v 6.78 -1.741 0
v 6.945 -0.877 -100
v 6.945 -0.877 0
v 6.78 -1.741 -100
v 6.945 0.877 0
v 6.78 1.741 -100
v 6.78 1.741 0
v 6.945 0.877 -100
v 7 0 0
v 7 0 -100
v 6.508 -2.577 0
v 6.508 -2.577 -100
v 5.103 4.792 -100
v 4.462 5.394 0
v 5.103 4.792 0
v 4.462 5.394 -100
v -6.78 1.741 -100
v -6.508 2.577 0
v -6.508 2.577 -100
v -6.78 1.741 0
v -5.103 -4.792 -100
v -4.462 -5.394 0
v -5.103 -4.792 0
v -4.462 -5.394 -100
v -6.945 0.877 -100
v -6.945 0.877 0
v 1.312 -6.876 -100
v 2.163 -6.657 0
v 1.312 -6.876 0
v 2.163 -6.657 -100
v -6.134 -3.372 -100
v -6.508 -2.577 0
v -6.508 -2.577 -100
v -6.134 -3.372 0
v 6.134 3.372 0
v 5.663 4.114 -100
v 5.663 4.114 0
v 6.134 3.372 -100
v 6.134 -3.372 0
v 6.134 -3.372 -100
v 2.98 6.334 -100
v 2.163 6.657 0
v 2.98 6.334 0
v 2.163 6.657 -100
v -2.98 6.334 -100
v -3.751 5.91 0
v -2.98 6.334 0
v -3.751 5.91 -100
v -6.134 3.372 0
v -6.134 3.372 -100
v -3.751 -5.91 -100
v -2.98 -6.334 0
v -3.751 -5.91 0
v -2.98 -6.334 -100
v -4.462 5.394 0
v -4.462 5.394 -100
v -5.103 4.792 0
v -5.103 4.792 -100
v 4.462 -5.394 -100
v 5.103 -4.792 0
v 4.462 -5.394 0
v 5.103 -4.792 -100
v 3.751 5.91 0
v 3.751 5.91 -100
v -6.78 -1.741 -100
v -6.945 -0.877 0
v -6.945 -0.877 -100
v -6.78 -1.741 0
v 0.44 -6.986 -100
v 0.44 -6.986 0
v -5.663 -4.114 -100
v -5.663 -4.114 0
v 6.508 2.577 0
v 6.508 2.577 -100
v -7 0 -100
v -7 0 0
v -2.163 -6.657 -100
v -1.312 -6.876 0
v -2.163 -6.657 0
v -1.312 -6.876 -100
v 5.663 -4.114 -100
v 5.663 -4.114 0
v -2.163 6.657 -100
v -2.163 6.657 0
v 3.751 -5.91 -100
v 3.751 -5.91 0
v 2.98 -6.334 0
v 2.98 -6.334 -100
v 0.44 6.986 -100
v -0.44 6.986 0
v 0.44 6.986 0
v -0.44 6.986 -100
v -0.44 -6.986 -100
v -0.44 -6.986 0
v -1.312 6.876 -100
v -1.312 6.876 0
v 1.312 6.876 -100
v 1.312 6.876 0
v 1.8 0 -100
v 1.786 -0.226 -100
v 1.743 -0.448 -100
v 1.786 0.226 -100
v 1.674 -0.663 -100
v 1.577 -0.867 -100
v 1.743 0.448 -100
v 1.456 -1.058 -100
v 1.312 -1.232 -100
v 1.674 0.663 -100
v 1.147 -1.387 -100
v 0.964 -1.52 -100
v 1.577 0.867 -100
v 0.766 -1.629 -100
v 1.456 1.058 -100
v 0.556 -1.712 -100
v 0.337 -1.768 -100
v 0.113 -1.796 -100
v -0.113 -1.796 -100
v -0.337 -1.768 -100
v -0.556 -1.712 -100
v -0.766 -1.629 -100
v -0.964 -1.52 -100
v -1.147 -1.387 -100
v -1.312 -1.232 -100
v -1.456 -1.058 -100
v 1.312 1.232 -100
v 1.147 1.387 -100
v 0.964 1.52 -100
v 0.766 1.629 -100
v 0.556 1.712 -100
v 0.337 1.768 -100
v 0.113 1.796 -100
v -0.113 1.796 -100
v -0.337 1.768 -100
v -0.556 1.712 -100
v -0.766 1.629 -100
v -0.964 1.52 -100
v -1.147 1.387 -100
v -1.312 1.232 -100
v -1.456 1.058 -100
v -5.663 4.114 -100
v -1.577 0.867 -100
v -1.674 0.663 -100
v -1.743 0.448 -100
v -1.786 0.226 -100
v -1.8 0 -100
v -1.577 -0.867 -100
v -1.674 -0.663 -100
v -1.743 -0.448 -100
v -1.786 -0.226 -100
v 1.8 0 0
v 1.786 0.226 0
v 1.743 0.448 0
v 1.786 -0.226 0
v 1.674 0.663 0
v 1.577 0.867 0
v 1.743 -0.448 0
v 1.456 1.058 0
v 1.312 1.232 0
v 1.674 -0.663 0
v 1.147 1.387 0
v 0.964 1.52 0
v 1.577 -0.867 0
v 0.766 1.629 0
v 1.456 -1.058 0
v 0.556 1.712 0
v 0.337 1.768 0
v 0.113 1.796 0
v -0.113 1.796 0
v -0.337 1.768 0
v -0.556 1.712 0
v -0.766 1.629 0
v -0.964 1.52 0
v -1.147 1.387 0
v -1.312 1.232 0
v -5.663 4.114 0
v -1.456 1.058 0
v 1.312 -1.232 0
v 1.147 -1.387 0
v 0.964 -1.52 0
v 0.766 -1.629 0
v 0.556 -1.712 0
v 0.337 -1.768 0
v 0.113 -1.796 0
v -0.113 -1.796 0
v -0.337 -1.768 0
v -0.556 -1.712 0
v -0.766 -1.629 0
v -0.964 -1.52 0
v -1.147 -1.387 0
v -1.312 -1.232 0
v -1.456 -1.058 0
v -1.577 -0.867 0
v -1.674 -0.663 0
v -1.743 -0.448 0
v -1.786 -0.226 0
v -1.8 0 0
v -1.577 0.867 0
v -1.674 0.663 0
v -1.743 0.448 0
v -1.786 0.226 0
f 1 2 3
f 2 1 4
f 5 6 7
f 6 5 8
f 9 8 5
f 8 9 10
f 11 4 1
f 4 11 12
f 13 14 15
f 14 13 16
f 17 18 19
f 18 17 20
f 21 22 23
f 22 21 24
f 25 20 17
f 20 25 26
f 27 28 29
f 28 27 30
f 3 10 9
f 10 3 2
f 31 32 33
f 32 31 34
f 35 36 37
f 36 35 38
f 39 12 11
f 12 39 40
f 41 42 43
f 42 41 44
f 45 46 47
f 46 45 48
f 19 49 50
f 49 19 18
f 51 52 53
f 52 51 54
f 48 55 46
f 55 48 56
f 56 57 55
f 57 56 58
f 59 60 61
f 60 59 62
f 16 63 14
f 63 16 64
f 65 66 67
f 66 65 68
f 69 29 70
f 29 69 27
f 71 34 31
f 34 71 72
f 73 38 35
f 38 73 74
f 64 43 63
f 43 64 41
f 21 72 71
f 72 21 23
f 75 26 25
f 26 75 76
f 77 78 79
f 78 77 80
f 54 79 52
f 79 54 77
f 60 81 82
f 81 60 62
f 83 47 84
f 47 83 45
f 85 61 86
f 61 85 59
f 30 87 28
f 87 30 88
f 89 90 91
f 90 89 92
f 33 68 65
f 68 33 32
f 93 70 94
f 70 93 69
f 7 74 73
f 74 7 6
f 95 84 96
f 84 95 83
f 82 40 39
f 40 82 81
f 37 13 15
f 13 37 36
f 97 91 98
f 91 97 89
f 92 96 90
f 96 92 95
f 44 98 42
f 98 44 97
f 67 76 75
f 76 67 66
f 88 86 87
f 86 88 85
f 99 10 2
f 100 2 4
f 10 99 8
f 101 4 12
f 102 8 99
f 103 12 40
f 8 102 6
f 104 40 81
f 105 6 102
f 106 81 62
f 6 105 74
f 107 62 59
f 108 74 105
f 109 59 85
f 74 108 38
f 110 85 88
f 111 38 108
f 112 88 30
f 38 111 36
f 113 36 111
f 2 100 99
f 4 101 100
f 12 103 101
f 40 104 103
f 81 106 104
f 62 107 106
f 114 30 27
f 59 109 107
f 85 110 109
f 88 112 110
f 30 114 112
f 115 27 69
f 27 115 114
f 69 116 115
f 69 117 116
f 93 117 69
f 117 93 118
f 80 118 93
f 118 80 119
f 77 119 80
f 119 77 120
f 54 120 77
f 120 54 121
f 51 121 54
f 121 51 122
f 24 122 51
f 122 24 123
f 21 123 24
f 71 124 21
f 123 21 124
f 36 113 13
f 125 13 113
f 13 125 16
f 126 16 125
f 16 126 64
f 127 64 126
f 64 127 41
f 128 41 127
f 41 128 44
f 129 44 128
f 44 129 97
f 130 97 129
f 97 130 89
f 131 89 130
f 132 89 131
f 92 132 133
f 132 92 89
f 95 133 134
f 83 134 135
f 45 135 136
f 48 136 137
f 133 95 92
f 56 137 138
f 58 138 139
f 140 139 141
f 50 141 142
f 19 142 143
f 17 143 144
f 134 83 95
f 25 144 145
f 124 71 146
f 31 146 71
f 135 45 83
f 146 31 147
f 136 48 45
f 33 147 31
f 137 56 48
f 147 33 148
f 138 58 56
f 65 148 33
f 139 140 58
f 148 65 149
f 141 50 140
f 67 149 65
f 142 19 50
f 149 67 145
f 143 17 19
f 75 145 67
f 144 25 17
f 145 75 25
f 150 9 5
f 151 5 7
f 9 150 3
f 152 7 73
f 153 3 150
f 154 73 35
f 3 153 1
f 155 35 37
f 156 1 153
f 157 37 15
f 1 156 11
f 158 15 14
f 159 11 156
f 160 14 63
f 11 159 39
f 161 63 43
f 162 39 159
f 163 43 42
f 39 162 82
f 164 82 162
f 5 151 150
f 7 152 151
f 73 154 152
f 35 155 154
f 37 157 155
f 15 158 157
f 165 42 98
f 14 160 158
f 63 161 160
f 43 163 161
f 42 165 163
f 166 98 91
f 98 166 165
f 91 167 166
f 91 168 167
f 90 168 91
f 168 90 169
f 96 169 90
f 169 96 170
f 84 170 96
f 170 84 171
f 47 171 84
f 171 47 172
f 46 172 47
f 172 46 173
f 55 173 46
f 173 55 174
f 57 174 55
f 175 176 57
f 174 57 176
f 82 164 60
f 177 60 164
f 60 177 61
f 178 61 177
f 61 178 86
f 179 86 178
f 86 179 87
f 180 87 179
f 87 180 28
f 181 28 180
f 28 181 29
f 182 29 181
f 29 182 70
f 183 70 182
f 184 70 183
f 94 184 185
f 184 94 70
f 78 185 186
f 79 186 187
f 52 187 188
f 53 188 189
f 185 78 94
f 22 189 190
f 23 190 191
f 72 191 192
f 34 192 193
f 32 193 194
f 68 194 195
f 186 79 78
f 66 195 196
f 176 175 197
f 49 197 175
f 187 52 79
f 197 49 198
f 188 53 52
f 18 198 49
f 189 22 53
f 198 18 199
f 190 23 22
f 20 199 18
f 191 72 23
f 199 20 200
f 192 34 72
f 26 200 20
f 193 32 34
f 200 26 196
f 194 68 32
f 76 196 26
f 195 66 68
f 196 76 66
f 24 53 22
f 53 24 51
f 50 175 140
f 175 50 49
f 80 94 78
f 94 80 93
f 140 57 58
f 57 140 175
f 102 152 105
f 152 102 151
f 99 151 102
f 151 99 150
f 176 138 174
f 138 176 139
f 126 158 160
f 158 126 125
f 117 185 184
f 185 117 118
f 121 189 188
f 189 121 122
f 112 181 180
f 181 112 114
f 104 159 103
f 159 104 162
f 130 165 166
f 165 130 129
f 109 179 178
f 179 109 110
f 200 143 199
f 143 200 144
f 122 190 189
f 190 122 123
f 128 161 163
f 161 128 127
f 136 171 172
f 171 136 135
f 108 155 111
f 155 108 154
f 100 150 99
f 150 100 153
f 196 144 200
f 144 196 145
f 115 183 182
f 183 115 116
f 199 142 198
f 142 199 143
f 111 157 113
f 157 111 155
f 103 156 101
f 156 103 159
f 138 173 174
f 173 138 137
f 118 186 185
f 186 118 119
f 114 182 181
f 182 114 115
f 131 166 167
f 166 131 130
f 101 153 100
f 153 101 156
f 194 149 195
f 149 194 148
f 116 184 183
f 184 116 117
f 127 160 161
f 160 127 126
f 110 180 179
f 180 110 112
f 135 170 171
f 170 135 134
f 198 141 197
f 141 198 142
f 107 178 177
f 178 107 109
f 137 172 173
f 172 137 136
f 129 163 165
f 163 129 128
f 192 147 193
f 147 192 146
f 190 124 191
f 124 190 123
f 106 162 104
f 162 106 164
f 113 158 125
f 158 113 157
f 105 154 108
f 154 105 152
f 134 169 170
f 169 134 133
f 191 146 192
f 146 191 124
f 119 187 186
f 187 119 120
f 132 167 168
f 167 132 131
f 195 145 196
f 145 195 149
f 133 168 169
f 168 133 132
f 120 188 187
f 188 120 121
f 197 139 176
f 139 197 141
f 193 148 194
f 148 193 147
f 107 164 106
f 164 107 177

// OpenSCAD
$fn = 50;


difference() {
	union() {
		translate(v = [0, 0, -100.0000000000]) {
			cylinder(h = 100, r = 7.0000000000);
		}
		cylinder(h = 0, r = 10.0000000000);
	}
	union() {
		#translate(v = [0, 0, -100]) {
			cylinder(h = 100, r = 1.8000000000);
		}
	}
}
